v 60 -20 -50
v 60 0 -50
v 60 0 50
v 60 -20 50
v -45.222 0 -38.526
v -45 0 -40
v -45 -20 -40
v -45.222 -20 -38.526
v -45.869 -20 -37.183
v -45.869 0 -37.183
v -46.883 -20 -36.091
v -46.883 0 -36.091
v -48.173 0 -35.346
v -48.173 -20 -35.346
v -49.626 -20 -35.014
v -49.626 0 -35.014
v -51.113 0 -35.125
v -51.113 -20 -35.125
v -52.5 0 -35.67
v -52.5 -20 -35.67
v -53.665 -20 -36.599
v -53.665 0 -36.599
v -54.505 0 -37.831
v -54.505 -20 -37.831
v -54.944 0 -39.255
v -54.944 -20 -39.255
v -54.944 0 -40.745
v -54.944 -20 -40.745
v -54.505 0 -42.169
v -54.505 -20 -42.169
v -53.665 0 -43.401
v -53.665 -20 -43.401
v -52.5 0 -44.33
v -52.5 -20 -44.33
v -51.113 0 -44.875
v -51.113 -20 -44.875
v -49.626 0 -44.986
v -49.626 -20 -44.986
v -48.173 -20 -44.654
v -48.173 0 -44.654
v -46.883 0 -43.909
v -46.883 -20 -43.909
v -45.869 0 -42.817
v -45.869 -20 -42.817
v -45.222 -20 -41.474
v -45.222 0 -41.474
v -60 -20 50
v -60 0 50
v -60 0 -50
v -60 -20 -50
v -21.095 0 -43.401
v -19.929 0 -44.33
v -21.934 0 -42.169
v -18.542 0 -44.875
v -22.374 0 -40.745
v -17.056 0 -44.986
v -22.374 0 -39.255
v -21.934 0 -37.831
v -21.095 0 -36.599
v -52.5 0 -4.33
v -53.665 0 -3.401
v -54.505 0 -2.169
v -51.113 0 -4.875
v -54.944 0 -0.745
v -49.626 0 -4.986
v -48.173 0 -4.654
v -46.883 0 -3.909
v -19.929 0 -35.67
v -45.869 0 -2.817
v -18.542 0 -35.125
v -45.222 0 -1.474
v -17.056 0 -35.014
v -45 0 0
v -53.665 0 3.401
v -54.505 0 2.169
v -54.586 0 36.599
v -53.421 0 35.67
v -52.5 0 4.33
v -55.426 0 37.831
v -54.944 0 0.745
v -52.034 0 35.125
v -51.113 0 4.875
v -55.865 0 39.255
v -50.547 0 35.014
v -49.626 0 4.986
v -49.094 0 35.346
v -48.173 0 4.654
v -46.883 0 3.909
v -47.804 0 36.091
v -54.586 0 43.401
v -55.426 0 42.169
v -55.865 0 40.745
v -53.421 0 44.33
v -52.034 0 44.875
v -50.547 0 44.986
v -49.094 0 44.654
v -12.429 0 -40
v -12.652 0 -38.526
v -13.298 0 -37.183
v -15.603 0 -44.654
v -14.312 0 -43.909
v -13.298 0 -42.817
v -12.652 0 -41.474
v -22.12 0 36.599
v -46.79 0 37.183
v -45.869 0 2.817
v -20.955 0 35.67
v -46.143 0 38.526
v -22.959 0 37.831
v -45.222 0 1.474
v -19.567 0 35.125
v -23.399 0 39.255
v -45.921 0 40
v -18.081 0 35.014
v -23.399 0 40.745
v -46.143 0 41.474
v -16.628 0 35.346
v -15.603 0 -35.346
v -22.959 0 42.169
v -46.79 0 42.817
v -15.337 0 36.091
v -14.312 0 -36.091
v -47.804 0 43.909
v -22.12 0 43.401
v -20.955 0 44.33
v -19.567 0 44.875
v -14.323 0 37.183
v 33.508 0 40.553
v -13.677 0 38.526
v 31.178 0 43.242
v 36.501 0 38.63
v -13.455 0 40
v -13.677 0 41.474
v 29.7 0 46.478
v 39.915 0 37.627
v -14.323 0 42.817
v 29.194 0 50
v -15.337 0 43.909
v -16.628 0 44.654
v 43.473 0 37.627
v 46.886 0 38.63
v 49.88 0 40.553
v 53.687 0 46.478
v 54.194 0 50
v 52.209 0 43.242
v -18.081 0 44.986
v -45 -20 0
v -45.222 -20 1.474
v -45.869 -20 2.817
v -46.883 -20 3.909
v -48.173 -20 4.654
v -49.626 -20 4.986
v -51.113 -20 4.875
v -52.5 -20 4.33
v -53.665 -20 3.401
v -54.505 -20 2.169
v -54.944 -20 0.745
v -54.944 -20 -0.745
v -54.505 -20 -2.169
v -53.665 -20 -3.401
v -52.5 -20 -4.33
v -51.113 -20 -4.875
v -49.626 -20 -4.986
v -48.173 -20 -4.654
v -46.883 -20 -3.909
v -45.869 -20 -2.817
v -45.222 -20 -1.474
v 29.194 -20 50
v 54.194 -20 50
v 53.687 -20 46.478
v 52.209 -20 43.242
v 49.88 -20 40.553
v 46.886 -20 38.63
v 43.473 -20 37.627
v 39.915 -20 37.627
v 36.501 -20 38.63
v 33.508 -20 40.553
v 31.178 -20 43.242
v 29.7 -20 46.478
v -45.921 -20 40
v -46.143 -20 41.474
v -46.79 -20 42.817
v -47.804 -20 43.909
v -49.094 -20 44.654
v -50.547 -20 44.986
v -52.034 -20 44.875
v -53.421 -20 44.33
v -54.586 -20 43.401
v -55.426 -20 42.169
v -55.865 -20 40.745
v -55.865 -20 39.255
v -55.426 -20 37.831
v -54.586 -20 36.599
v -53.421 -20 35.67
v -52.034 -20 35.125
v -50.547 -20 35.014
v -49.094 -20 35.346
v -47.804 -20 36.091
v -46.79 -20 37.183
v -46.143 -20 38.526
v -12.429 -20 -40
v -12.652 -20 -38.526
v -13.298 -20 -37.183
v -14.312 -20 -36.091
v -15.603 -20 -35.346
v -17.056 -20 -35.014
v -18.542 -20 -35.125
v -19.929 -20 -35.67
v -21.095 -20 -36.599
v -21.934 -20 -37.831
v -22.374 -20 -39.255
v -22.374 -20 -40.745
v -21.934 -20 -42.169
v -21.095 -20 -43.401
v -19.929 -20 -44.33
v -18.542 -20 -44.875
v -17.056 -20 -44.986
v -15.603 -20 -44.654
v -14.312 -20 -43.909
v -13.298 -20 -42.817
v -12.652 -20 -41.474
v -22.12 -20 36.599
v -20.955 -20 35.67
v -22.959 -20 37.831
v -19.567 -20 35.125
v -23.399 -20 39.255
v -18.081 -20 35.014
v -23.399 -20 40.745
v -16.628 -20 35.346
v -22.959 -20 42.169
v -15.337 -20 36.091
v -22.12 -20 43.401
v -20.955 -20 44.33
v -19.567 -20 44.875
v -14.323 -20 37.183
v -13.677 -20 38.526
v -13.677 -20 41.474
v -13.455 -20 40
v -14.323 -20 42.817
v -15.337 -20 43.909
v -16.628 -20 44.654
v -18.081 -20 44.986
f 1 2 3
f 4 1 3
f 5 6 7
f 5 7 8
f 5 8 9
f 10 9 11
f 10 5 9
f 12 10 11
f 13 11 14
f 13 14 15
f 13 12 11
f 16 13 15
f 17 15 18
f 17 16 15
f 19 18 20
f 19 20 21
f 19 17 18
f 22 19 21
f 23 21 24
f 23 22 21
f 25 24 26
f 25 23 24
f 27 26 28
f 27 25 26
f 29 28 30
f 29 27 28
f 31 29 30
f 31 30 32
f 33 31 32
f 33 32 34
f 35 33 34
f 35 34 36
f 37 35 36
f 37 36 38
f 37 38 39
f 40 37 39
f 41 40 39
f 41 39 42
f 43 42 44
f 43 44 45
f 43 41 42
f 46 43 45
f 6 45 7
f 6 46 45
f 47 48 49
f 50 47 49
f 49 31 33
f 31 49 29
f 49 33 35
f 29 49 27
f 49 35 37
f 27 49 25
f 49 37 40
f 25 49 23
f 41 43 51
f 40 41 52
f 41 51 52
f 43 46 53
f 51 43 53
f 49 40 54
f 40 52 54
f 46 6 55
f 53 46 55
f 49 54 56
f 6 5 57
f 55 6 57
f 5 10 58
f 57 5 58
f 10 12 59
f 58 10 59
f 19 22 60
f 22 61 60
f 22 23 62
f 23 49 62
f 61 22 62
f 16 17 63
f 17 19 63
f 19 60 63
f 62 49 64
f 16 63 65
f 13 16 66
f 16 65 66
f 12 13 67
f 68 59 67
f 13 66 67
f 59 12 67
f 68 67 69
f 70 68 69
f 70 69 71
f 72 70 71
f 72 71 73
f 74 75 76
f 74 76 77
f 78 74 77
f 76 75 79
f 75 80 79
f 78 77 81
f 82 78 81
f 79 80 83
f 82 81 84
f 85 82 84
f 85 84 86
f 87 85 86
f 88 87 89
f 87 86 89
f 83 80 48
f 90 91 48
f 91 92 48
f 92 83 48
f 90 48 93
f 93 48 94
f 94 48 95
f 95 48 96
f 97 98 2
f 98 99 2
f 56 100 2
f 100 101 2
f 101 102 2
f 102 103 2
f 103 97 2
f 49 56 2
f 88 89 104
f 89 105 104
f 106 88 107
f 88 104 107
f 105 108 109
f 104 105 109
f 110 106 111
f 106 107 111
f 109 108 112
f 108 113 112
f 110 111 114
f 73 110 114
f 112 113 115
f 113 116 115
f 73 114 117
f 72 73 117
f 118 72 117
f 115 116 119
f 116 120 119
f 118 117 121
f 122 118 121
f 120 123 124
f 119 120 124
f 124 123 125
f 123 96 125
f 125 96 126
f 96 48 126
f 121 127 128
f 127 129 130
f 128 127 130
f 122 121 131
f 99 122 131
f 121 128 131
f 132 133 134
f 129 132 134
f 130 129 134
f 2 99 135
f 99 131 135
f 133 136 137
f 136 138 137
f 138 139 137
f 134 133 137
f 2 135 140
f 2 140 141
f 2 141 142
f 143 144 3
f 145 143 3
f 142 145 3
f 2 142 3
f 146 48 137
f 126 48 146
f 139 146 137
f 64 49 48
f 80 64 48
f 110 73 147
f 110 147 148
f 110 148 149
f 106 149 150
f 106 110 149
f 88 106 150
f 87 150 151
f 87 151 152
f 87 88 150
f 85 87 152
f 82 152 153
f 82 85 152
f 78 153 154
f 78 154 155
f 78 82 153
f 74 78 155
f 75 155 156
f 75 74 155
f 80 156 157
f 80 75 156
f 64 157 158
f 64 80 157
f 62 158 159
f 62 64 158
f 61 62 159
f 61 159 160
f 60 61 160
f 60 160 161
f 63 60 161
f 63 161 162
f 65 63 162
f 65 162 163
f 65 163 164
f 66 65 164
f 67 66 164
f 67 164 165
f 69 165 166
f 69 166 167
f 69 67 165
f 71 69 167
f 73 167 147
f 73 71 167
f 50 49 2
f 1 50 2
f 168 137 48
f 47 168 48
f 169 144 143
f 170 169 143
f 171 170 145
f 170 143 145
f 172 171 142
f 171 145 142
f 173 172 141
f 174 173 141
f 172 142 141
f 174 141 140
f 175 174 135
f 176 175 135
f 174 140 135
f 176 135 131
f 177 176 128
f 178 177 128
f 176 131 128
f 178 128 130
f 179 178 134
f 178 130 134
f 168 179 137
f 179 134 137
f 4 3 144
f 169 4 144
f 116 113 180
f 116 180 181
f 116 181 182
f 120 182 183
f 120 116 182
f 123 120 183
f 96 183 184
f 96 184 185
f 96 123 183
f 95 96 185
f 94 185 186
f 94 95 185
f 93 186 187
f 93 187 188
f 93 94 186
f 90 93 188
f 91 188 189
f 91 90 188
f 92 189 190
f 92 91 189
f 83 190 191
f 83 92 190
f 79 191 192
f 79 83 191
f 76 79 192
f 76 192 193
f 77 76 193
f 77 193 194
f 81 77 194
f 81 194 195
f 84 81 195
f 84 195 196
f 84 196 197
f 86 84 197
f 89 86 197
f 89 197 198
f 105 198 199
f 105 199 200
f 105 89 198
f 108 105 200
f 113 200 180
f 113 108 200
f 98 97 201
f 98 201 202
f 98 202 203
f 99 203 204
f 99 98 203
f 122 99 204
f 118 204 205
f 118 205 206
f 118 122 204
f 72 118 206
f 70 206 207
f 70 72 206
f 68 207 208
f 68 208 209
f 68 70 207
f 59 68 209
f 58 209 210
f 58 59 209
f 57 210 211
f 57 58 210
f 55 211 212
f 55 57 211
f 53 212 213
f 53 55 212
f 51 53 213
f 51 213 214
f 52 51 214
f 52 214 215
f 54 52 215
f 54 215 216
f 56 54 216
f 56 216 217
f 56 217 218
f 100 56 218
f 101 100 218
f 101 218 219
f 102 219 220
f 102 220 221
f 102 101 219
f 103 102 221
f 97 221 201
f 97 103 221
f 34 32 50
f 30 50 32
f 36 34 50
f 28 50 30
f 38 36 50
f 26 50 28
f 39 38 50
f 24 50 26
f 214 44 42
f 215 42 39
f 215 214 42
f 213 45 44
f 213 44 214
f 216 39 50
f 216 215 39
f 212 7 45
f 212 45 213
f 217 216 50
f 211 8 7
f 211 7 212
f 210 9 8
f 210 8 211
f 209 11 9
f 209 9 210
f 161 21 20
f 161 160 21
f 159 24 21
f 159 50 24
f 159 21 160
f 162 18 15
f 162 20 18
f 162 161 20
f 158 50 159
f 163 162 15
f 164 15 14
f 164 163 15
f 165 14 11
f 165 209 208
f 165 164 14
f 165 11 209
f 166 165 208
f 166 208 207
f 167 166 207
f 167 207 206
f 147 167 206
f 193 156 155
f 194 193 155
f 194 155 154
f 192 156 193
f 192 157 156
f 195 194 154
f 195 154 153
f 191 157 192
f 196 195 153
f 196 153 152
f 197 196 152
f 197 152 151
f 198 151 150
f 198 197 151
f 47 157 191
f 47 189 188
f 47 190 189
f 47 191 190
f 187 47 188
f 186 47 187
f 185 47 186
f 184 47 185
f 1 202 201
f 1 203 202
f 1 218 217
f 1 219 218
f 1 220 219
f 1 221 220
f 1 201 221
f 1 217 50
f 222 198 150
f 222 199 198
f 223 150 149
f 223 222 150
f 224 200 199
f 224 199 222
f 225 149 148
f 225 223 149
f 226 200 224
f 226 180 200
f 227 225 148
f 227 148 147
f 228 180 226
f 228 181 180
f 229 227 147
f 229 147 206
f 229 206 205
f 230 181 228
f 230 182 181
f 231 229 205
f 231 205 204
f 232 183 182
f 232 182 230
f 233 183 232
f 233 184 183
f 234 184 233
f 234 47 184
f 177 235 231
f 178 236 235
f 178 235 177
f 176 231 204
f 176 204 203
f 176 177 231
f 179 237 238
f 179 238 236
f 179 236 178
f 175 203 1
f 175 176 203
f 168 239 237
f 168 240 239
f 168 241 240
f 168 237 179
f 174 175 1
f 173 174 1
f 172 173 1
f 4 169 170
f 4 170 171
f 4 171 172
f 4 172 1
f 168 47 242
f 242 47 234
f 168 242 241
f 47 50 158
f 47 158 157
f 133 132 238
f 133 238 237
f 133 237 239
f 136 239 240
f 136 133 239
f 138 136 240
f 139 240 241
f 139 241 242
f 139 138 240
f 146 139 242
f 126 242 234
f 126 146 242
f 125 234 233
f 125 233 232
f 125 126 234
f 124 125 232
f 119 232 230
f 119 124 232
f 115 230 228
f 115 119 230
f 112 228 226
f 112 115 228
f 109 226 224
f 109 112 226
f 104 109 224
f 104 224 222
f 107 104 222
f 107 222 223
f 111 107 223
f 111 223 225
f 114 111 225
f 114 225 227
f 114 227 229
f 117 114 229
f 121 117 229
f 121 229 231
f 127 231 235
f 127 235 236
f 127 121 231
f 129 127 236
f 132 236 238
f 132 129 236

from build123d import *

# Parameters (mm, degrees)
F0_R     = 5
F2_DEPTH = 20


with BuildPart() as f2:
    # F0 (on Front) → F2 (new body)
    with BuildSketch(Plane.XZ):
        with BuildLine():
            Line((29.193788, 50), (-60, 50))
            Line((-60, 50), (-60, -50))
            Line((-60, -50), (60, -50))
            Line((60, -50), (60, 50))
            Line((60, 50), (54.193788, 50))
            ThreePointArc((54.193788, 50), (41.693788, 37.5), (29.193788, 50))
        make_face()
        with Locations((-50, -40)):
            Circle(F0_R, mode=Mode.SUBTRACT)
        with Locations((-17.42937, -40)):
            Circle(F0_R, mode=Mode.SUBTRACT)
        with Locations((-50, 0)):
            Circle(F0_R, mode=Mode.SUBTRACT)
        with Locations((-50.921101, 40)):
            Circle(F0_R, mode=Mode.SUBTRACT)
        with Locations((-18.454628, 40)):
            Circle(F0_R, mode=Mode.SUBTRACT)
    extrude(amount=F2_DEPTH)


solid = f2.part
